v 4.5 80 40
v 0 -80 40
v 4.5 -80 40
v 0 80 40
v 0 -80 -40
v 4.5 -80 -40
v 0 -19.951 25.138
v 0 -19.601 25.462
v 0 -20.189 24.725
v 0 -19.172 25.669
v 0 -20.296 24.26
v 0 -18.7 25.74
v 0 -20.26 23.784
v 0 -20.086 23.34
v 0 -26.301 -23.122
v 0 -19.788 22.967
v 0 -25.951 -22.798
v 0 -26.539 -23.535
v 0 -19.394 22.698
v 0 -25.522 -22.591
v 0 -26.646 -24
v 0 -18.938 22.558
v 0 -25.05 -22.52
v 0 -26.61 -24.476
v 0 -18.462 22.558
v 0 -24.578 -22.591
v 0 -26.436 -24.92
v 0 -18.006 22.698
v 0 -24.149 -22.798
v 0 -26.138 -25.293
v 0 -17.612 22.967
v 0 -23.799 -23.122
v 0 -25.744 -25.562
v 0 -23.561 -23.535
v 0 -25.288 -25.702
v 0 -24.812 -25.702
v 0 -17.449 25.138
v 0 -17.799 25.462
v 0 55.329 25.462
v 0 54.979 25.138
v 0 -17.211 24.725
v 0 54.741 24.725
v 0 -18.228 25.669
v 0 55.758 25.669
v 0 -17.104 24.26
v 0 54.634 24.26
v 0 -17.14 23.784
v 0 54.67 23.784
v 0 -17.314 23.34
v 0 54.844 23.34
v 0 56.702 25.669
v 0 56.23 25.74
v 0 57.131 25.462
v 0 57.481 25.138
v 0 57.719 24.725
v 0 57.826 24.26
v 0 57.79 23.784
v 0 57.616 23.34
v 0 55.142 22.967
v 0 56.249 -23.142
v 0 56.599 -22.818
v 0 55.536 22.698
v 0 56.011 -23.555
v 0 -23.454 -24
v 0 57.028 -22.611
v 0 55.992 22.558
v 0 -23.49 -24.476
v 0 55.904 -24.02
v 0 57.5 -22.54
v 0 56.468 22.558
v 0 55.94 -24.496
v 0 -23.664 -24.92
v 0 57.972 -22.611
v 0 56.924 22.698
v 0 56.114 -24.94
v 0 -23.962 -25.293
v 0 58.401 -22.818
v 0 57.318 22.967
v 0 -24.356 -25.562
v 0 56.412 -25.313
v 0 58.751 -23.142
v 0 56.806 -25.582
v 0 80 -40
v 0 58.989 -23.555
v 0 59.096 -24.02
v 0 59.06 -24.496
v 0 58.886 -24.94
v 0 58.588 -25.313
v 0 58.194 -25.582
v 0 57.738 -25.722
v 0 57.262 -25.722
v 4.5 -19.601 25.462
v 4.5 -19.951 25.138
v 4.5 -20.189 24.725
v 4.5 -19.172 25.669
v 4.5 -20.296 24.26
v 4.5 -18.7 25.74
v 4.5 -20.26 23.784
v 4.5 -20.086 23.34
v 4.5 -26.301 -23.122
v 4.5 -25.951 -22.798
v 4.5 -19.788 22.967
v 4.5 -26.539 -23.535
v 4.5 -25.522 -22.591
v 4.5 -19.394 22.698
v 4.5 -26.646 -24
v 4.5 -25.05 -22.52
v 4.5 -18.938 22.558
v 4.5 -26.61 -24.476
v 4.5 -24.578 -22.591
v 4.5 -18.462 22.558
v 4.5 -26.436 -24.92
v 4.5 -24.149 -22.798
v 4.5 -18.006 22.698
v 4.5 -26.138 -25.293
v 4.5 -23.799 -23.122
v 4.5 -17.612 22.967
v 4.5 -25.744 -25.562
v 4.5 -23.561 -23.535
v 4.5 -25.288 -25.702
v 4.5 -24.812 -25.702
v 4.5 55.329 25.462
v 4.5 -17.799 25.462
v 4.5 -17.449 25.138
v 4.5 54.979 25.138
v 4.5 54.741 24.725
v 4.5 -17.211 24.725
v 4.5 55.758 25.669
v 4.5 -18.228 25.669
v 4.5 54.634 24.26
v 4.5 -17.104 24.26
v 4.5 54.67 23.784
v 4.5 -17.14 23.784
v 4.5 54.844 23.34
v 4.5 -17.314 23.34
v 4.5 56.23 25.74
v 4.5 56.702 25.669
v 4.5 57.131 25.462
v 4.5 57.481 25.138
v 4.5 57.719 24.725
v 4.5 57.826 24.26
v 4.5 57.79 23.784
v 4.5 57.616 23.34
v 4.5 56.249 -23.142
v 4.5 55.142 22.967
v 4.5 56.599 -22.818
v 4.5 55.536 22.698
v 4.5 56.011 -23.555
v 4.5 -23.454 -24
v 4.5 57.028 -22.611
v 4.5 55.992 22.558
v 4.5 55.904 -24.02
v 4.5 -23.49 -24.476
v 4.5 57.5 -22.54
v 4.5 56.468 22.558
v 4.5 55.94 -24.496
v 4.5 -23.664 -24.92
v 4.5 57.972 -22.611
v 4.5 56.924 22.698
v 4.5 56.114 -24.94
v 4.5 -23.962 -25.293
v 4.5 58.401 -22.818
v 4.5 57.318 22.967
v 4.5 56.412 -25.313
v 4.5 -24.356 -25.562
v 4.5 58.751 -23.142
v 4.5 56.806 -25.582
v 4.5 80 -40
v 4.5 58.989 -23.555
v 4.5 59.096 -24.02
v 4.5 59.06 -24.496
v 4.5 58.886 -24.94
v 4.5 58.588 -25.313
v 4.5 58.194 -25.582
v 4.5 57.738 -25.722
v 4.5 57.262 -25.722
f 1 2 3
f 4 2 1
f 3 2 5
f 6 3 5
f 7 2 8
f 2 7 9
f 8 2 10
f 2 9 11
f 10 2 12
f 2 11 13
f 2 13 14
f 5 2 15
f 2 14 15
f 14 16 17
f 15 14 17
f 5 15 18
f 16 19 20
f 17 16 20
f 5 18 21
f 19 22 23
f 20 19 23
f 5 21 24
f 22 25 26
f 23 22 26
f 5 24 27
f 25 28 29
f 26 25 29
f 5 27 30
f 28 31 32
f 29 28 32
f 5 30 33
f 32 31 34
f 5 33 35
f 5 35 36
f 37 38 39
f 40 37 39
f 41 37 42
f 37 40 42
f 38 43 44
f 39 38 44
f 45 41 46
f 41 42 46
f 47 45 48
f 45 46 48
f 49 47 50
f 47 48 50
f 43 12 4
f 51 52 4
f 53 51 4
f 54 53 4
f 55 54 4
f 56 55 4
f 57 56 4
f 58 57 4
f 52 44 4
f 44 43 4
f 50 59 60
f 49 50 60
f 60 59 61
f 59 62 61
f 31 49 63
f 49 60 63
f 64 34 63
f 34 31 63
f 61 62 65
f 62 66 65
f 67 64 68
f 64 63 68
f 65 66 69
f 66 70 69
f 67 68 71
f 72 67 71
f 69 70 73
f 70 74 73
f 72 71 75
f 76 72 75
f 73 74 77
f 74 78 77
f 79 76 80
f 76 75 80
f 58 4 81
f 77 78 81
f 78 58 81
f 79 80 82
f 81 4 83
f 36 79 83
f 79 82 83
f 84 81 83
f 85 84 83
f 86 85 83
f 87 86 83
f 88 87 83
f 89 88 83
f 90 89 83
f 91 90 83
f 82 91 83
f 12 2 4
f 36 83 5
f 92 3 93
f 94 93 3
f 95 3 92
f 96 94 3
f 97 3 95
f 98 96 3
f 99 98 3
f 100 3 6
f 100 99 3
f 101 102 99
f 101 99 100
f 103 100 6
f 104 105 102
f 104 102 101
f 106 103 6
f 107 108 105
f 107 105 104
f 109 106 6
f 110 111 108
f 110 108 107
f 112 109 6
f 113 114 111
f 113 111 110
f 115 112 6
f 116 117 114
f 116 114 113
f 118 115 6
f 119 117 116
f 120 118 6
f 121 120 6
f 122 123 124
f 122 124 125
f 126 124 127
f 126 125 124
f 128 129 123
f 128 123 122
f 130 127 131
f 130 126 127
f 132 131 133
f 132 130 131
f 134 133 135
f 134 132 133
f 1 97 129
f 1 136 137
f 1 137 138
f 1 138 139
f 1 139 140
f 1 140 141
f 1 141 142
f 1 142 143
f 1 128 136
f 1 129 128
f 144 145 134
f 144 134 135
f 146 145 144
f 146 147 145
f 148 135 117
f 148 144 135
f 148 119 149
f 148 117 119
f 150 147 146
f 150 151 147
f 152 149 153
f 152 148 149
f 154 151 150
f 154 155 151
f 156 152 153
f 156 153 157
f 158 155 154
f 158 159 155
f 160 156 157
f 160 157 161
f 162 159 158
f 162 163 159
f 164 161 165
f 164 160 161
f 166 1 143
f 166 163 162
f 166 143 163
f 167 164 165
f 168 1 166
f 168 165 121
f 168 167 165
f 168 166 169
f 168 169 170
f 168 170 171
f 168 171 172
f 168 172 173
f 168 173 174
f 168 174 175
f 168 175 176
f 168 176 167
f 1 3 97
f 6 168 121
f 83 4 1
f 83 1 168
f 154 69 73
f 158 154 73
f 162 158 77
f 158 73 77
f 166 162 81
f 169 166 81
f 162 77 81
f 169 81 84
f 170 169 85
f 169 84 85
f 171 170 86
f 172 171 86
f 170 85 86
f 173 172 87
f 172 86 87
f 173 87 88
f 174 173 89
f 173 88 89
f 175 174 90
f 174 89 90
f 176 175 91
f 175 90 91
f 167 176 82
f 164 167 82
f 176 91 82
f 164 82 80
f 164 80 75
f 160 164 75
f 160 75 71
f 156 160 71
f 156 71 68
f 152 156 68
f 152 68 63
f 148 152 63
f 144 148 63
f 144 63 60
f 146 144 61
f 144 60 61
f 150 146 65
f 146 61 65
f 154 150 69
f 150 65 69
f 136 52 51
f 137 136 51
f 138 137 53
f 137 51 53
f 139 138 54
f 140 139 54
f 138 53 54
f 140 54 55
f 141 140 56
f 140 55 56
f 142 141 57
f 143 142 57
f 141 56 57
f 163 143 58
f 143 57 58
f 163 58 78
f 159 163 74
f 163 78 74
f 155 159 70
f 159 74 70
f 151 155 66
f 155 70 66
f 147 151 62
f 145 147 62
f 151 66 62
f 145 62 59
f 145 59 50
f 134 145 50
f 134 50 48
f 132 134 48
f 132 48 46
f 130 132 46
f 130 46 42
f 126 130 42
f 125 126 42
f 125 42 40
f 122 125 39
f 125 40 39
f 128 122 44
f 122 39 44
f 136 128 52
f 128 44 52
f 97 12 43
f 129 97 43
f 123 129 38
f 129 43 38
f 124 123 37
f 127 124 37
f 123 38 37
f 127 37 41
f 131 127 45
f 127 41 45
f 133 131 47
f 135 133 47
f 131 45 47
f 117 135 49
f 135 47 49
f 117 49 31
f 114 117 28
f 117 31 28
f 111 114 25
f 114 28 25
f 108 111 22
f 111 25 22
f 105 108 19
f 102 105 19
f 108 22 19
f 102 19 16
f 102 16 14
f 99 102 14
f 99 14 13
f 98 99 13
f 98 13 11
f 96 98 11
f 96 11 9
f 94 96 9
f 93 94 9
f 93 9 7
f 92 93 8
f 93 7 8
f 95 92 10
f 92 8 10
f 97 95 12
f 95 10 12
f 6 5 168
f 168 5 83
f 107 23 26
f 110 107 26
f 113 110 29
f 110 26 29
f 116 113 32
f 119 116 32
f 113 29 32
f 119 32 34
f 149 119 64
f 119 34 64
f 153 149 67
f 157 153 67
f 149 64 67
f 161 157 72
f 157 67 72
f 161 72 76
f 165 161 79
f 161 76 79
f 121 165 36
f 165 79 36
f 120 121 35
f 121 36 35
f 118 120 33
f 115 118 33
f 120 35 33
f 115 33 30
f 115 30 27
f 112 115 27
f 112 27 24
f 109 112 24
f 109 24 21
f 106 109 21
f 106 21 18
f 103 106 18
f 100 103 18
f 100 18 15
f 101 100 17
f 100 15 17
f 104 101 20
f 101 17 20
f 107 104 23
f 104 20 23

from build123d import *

# Parameters (mm, degrees)
SKETCH1_W           = 80
SKETCH1_H           = 160
BOSS_EXTRUDE1_DEPTH = 4.5
SKETCH2_R           = 1.6
CUT_EXTRUDE1_DEPTH  = 4.5


with BuildPart() as part:
    # Sketch1 → Boss-Extrude1 (new body)
    with BuildSketch(Plane(origin=(0, 0, 0), x_dir=(0, 0, -1), z_dir=(1, 0, 0))):
        Rectangle(SKETCH1_W, SKETCH1_H)
    extrude(amount=BOSS_EXTRUDE1_DEPTH)

    # Sketch2 → Cut-Extrude1 (cut)
    with BuildSketch(Plane.ZY):
        with Locations((-24.14, 57.5)):
            Circle(SKETCH2_R)
        with Locations((24.14, 56.23)):
            Circle(SKETCH2_R)
        with Locations((24.14, -18.7)):
            Circle(SKETCH2_R)
        with Locations((-24.12, -25.05)):
            Circle(SKETCH2_R)
    extrude(amount=-CUT_EXTRUDE1_DEPTH, mode=Mode.SUBTRACT)


solid = part.part
